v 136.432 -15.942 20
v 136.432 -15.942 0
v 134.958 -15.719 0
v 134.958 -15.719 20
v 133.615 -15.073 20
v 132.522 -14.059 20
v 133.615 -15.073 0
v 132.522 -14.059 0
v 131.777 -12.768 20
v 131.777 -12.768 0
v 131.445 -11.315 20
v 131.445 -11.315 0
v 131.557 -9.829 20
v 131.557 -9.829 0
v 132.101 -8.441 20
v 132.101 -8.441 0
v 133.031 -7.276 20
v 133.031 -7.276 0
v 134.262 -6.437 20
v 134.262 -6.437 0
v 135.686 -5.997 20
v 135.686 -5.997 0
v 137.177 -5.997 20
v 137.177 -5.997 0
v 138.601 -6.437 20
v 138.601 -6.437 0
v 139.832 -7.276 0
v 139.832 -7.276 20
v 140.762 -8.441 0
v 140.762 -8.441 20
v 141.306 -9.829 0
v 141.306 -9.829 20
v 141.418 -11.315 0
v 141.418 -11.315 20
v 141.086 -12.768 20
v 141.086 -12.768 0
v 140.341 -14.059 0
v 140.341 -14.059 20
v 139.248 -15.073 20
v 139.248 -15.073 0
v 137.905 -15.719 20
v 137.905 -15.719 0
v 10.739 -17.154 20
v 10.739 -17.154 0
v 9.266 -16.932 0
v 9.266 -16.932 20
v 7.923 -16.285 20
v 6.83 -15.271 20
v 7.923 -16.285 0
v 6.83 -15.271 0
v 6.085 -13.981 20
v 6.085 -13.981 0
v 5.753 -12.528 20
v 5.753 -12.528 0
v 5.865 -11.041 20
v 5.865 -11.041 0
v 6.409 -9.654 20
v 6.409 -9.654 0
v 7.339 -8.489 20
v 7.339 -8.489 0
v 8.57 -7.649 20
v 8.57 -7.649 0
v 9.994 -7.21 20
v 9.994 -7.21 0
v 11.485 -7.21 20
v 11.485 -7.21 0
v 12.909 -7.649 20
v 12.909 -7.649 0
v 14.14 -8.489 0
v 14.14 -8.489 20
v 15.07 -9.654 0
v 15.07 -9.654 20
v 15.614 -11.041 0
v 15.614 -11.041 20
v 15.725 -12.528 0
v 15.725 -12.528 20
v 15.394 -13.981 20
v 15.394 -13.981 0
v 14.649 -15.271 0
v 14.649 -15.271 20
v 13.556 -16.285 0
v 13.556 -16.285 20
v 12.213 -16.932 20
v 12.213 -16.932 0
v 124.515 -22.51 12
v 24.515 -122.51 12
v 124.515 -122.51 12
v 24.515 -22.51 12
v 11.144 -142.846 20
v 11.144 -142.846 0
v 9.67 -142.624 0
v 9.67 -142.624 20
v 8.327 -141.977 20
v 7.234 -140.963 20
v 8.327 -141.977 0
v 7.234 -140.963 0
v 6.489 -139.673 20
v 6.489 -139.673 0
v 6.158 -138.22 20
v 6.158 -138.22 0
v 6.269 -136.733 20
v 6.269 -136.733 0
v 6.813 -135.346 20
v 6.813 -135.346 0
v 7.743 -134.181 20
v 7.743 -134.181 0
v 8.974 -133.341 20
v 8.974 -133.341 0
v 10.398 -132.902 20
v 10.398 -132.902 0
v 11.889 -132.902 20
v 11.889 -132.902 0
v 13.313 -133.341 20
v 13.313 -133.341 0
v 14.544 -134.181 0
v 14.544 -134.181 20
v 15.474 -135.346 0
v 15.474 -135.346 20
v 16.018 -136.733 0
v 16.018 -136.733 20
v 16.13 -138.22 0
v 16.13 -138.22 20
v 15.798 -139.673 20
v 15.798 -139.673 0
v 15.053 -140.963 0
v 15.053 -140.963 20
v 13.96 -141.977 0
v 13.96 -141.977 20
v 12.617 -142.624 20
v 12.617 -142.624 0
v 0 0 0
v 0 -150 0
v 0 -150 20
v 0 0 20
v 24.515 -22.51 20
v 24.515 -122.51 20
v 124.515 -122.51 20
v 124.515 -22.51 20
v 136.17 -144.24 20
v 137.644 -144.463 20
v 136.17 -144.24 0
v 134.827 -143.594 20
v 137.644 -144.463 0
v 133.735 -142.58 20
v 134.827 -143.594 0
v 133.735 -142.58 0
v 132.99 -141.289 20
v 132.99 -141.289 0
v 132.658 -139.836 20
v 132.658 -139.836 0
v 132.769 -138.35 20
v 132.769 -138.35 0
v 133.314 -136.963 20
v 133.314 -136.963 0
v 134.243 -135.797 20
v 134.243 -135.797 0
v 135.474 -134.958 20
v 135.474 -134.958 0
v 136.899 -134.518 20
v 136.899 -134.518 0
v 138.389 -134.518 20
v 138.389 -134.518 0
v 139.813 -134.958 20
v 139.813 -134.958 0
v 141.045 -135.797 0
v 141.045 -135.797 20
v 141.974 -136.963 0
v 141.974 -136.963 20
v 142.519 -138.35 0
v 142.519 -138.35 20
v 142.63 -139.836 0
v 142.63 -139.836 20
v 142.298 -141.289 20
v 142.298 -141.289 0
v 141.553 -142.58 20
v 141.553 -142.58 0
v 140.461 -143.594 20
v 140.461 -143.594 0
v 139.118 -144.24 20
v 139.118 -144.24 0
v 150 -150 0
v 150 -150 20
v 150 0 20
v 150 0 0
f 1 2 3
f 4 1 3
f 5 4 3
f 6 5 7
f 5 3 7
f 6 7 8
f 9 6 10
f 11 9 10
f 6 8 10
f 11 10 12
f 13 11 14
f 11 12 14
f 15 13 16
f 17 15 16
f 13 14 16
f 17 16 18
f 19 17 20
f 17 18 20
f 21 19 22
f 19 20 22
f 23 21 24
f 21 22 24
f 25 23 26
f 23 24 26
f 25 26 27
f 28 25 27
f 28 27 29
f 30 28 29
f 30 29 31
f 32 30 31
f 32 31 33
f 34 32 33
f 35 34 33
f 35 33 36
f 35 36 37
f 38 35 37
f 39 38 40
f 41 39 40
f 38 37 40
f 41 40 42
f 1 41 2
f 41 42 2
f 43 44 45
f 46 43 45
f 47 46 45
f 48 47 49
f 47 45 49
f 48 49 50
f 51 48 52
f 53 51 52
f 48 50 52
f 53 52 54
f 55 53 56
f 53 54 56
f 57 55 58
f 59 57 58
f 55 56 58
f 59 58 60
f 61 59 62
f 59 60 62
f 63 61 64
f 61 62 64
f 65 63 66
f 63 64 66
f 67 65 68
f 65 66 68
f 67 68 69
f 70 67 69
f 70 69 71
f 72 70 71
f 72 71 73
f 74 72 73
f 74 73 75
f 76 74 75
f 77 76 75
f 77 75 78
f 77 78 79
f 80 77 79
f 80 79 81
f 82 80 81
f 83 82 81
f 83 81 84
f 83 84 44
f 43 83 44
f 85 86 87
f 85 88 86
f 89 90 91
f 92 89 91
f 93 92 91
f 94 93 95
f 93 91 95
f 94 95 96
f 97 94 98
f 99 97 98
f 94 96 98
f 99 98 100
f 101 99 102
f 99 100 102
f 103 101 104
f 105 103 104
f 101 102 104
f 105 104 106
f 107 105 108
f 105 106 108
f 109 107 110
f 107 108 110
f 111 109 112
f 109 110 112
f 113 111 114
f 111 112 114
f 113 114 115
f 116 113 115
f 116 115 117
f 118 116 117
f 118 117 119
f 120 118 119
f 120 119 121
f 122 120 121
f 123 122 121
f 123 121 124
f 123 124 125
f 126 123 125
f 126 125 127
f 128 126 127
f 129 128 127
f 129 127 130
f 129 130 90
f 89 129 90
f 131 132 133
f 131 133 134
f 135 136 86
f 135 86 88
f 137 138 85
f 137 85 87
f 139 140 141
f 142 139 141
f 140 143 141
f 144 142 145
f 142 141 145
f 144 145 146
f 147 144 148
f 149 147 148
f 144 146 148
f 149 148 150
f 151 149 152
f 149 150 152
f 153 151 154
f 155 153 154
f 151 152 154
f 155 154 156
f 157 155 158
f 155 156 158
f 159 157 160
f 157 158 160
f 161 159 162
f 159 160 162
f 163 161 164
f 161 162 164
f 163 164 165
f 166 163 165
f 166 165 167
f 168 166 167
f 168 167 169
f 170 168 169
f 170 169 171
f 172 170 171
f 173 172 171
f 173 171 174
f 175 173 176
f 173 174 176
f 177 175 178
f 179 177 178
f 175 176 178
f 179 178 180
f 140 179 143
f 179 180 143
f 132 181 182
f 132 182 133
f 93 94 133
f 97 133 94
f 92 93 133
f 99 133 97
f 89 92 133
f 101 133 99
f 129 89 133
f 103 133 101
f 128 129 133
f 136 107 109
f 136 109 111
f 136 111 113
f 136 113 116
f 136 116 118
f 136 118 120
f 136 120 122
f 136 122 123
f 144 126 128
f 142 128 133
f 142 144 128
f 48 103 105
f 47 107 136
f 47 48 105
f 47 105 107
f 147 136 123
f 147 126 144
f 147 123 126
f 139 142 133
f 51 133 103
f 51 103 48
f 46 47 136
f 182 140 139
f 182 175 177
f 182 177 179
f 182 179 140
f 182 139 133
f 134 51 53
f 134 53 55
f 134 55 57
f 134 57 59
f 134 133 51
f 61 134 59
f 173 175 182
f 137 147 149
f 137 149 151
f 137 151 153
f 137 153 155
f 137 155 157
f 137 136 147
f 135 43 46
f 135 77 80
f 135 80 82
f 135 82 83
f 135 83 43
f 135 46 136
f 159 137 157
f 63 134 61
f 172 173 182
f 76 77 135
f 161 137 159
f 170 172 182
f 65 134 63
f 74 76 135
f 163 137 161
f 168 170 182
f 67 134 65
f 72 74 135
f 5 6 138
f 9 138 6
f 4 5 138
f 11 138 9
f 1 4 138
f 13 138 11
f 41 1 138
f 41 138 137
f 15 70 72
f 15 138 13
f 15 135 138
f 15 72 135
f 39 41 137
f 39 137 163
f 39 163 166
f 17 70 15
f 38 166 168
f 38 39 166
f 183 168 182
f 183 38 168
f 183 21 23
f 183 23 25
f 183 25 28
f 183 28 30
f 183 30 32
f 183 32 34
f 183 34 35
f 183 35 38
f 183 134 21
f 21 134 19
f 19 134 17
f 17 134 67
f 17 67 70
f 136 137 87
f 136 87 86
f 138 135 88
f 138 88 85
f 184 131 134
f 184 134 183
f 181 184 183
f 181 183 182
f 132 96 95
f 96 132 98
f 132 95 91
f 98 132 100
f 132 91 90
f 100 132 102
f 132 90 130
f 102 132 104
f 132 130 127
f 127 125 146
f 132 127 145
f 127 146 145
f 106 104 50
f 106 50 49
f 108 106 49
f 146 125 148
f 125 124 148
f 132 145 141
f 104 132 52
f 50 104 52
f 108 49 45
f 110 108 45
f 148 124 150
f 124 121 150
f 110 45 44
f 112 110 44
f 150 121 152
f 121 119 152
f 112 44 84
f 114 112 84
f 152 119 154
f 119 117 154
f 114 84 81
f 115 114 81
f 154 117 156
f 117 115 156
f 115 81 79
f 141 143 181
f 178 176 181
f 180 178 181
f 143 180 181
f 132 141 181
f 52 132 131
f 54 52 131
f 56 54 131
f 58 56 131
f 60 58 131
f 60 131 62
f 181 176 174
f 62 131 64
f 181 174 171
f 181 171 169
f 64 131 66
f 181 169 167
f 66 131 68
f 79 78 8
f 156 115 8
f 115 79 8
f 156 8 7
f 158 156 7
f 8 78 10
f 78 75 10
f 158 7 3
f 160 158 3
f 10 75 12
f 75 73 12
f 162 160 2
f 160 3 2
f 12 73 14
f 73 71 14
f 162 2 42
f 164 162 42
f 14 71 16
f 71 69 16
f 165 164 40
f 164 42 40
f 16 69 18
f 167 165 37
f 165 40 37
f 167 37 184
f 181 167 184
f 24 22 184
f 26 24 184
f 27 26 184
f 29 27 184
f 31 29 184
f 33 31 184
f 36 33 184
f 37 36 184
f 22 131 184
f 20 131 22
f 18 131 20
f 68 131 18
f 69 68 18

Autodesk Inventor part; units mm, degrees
ref_plane "YZ Plane" through (0, 0, 0) normal (1, 0, 0) x (0, 1, 0)
ref_plane "XZ Plane" through (0, 0, 0) normal (0, 1, 0) x (-1, 0, 0)
ref_plane "XY Plane" through (0, 0, 0) normal (0, 0, 1) x (1, 0, 0)
sketch "Sketch1" plane through (0, 0, 0) normal (0, 0, 1) x (1, 0, 0)
  line L0 (0, 0) -> (150, 0)
  line L1 (150, 0) -> (150, -150)
  line L2 (150, -150) -> (0, -150)
  line L3 (0, -150) -> (0, 0)
  dimension "d0" = 150
  dimension "d1" = 150
extrude "Extrusion1" add sketch "Sketch1" along normal blind 20
sketch "Sketch2" plane through (0, 0, 20) normal (0, 0, 1) x (1, 0, 0)
  line L0 (24.5154, -22.5096) -> (124.5154, -22.5096)
  line L1 (124.5154, -22.5096) -> (124.5154, -122.5096)
  line L2 (124.5154, -122.5096) -> (24.5154, -122.5096)
  line L3 (24.5154, -122.5096) -> (24.5154, -22.5096)
  point P0 (0, 0)
  dimension "d4" = 100
  dimension "d5" = 100
extrude "Extrusion2" cut sketch "Sketch2" against normal blind 8
sketch "Sketch3" plane through (0, 0, 20) normal (0, 0, 1) x (1, 0, 0)
  point P0 (0, 0)
  point P1 (10.7394, -12.154)
  point P2 (136.4315, -10.9415)
  point P3 (137.6439, -139.4626)
  point P4 (11.1436, -137.846)
hole "Hole1" at (10.7394, -12.154, 20) at (136.4315, -10.9415, 20) at (137.6439, -139.4626, 20) at (11.1436, -137.846, 20) direction (0, 0, -1) diameter 10 depth 30 tip angle 118
properties part number "carromboard15cm"
